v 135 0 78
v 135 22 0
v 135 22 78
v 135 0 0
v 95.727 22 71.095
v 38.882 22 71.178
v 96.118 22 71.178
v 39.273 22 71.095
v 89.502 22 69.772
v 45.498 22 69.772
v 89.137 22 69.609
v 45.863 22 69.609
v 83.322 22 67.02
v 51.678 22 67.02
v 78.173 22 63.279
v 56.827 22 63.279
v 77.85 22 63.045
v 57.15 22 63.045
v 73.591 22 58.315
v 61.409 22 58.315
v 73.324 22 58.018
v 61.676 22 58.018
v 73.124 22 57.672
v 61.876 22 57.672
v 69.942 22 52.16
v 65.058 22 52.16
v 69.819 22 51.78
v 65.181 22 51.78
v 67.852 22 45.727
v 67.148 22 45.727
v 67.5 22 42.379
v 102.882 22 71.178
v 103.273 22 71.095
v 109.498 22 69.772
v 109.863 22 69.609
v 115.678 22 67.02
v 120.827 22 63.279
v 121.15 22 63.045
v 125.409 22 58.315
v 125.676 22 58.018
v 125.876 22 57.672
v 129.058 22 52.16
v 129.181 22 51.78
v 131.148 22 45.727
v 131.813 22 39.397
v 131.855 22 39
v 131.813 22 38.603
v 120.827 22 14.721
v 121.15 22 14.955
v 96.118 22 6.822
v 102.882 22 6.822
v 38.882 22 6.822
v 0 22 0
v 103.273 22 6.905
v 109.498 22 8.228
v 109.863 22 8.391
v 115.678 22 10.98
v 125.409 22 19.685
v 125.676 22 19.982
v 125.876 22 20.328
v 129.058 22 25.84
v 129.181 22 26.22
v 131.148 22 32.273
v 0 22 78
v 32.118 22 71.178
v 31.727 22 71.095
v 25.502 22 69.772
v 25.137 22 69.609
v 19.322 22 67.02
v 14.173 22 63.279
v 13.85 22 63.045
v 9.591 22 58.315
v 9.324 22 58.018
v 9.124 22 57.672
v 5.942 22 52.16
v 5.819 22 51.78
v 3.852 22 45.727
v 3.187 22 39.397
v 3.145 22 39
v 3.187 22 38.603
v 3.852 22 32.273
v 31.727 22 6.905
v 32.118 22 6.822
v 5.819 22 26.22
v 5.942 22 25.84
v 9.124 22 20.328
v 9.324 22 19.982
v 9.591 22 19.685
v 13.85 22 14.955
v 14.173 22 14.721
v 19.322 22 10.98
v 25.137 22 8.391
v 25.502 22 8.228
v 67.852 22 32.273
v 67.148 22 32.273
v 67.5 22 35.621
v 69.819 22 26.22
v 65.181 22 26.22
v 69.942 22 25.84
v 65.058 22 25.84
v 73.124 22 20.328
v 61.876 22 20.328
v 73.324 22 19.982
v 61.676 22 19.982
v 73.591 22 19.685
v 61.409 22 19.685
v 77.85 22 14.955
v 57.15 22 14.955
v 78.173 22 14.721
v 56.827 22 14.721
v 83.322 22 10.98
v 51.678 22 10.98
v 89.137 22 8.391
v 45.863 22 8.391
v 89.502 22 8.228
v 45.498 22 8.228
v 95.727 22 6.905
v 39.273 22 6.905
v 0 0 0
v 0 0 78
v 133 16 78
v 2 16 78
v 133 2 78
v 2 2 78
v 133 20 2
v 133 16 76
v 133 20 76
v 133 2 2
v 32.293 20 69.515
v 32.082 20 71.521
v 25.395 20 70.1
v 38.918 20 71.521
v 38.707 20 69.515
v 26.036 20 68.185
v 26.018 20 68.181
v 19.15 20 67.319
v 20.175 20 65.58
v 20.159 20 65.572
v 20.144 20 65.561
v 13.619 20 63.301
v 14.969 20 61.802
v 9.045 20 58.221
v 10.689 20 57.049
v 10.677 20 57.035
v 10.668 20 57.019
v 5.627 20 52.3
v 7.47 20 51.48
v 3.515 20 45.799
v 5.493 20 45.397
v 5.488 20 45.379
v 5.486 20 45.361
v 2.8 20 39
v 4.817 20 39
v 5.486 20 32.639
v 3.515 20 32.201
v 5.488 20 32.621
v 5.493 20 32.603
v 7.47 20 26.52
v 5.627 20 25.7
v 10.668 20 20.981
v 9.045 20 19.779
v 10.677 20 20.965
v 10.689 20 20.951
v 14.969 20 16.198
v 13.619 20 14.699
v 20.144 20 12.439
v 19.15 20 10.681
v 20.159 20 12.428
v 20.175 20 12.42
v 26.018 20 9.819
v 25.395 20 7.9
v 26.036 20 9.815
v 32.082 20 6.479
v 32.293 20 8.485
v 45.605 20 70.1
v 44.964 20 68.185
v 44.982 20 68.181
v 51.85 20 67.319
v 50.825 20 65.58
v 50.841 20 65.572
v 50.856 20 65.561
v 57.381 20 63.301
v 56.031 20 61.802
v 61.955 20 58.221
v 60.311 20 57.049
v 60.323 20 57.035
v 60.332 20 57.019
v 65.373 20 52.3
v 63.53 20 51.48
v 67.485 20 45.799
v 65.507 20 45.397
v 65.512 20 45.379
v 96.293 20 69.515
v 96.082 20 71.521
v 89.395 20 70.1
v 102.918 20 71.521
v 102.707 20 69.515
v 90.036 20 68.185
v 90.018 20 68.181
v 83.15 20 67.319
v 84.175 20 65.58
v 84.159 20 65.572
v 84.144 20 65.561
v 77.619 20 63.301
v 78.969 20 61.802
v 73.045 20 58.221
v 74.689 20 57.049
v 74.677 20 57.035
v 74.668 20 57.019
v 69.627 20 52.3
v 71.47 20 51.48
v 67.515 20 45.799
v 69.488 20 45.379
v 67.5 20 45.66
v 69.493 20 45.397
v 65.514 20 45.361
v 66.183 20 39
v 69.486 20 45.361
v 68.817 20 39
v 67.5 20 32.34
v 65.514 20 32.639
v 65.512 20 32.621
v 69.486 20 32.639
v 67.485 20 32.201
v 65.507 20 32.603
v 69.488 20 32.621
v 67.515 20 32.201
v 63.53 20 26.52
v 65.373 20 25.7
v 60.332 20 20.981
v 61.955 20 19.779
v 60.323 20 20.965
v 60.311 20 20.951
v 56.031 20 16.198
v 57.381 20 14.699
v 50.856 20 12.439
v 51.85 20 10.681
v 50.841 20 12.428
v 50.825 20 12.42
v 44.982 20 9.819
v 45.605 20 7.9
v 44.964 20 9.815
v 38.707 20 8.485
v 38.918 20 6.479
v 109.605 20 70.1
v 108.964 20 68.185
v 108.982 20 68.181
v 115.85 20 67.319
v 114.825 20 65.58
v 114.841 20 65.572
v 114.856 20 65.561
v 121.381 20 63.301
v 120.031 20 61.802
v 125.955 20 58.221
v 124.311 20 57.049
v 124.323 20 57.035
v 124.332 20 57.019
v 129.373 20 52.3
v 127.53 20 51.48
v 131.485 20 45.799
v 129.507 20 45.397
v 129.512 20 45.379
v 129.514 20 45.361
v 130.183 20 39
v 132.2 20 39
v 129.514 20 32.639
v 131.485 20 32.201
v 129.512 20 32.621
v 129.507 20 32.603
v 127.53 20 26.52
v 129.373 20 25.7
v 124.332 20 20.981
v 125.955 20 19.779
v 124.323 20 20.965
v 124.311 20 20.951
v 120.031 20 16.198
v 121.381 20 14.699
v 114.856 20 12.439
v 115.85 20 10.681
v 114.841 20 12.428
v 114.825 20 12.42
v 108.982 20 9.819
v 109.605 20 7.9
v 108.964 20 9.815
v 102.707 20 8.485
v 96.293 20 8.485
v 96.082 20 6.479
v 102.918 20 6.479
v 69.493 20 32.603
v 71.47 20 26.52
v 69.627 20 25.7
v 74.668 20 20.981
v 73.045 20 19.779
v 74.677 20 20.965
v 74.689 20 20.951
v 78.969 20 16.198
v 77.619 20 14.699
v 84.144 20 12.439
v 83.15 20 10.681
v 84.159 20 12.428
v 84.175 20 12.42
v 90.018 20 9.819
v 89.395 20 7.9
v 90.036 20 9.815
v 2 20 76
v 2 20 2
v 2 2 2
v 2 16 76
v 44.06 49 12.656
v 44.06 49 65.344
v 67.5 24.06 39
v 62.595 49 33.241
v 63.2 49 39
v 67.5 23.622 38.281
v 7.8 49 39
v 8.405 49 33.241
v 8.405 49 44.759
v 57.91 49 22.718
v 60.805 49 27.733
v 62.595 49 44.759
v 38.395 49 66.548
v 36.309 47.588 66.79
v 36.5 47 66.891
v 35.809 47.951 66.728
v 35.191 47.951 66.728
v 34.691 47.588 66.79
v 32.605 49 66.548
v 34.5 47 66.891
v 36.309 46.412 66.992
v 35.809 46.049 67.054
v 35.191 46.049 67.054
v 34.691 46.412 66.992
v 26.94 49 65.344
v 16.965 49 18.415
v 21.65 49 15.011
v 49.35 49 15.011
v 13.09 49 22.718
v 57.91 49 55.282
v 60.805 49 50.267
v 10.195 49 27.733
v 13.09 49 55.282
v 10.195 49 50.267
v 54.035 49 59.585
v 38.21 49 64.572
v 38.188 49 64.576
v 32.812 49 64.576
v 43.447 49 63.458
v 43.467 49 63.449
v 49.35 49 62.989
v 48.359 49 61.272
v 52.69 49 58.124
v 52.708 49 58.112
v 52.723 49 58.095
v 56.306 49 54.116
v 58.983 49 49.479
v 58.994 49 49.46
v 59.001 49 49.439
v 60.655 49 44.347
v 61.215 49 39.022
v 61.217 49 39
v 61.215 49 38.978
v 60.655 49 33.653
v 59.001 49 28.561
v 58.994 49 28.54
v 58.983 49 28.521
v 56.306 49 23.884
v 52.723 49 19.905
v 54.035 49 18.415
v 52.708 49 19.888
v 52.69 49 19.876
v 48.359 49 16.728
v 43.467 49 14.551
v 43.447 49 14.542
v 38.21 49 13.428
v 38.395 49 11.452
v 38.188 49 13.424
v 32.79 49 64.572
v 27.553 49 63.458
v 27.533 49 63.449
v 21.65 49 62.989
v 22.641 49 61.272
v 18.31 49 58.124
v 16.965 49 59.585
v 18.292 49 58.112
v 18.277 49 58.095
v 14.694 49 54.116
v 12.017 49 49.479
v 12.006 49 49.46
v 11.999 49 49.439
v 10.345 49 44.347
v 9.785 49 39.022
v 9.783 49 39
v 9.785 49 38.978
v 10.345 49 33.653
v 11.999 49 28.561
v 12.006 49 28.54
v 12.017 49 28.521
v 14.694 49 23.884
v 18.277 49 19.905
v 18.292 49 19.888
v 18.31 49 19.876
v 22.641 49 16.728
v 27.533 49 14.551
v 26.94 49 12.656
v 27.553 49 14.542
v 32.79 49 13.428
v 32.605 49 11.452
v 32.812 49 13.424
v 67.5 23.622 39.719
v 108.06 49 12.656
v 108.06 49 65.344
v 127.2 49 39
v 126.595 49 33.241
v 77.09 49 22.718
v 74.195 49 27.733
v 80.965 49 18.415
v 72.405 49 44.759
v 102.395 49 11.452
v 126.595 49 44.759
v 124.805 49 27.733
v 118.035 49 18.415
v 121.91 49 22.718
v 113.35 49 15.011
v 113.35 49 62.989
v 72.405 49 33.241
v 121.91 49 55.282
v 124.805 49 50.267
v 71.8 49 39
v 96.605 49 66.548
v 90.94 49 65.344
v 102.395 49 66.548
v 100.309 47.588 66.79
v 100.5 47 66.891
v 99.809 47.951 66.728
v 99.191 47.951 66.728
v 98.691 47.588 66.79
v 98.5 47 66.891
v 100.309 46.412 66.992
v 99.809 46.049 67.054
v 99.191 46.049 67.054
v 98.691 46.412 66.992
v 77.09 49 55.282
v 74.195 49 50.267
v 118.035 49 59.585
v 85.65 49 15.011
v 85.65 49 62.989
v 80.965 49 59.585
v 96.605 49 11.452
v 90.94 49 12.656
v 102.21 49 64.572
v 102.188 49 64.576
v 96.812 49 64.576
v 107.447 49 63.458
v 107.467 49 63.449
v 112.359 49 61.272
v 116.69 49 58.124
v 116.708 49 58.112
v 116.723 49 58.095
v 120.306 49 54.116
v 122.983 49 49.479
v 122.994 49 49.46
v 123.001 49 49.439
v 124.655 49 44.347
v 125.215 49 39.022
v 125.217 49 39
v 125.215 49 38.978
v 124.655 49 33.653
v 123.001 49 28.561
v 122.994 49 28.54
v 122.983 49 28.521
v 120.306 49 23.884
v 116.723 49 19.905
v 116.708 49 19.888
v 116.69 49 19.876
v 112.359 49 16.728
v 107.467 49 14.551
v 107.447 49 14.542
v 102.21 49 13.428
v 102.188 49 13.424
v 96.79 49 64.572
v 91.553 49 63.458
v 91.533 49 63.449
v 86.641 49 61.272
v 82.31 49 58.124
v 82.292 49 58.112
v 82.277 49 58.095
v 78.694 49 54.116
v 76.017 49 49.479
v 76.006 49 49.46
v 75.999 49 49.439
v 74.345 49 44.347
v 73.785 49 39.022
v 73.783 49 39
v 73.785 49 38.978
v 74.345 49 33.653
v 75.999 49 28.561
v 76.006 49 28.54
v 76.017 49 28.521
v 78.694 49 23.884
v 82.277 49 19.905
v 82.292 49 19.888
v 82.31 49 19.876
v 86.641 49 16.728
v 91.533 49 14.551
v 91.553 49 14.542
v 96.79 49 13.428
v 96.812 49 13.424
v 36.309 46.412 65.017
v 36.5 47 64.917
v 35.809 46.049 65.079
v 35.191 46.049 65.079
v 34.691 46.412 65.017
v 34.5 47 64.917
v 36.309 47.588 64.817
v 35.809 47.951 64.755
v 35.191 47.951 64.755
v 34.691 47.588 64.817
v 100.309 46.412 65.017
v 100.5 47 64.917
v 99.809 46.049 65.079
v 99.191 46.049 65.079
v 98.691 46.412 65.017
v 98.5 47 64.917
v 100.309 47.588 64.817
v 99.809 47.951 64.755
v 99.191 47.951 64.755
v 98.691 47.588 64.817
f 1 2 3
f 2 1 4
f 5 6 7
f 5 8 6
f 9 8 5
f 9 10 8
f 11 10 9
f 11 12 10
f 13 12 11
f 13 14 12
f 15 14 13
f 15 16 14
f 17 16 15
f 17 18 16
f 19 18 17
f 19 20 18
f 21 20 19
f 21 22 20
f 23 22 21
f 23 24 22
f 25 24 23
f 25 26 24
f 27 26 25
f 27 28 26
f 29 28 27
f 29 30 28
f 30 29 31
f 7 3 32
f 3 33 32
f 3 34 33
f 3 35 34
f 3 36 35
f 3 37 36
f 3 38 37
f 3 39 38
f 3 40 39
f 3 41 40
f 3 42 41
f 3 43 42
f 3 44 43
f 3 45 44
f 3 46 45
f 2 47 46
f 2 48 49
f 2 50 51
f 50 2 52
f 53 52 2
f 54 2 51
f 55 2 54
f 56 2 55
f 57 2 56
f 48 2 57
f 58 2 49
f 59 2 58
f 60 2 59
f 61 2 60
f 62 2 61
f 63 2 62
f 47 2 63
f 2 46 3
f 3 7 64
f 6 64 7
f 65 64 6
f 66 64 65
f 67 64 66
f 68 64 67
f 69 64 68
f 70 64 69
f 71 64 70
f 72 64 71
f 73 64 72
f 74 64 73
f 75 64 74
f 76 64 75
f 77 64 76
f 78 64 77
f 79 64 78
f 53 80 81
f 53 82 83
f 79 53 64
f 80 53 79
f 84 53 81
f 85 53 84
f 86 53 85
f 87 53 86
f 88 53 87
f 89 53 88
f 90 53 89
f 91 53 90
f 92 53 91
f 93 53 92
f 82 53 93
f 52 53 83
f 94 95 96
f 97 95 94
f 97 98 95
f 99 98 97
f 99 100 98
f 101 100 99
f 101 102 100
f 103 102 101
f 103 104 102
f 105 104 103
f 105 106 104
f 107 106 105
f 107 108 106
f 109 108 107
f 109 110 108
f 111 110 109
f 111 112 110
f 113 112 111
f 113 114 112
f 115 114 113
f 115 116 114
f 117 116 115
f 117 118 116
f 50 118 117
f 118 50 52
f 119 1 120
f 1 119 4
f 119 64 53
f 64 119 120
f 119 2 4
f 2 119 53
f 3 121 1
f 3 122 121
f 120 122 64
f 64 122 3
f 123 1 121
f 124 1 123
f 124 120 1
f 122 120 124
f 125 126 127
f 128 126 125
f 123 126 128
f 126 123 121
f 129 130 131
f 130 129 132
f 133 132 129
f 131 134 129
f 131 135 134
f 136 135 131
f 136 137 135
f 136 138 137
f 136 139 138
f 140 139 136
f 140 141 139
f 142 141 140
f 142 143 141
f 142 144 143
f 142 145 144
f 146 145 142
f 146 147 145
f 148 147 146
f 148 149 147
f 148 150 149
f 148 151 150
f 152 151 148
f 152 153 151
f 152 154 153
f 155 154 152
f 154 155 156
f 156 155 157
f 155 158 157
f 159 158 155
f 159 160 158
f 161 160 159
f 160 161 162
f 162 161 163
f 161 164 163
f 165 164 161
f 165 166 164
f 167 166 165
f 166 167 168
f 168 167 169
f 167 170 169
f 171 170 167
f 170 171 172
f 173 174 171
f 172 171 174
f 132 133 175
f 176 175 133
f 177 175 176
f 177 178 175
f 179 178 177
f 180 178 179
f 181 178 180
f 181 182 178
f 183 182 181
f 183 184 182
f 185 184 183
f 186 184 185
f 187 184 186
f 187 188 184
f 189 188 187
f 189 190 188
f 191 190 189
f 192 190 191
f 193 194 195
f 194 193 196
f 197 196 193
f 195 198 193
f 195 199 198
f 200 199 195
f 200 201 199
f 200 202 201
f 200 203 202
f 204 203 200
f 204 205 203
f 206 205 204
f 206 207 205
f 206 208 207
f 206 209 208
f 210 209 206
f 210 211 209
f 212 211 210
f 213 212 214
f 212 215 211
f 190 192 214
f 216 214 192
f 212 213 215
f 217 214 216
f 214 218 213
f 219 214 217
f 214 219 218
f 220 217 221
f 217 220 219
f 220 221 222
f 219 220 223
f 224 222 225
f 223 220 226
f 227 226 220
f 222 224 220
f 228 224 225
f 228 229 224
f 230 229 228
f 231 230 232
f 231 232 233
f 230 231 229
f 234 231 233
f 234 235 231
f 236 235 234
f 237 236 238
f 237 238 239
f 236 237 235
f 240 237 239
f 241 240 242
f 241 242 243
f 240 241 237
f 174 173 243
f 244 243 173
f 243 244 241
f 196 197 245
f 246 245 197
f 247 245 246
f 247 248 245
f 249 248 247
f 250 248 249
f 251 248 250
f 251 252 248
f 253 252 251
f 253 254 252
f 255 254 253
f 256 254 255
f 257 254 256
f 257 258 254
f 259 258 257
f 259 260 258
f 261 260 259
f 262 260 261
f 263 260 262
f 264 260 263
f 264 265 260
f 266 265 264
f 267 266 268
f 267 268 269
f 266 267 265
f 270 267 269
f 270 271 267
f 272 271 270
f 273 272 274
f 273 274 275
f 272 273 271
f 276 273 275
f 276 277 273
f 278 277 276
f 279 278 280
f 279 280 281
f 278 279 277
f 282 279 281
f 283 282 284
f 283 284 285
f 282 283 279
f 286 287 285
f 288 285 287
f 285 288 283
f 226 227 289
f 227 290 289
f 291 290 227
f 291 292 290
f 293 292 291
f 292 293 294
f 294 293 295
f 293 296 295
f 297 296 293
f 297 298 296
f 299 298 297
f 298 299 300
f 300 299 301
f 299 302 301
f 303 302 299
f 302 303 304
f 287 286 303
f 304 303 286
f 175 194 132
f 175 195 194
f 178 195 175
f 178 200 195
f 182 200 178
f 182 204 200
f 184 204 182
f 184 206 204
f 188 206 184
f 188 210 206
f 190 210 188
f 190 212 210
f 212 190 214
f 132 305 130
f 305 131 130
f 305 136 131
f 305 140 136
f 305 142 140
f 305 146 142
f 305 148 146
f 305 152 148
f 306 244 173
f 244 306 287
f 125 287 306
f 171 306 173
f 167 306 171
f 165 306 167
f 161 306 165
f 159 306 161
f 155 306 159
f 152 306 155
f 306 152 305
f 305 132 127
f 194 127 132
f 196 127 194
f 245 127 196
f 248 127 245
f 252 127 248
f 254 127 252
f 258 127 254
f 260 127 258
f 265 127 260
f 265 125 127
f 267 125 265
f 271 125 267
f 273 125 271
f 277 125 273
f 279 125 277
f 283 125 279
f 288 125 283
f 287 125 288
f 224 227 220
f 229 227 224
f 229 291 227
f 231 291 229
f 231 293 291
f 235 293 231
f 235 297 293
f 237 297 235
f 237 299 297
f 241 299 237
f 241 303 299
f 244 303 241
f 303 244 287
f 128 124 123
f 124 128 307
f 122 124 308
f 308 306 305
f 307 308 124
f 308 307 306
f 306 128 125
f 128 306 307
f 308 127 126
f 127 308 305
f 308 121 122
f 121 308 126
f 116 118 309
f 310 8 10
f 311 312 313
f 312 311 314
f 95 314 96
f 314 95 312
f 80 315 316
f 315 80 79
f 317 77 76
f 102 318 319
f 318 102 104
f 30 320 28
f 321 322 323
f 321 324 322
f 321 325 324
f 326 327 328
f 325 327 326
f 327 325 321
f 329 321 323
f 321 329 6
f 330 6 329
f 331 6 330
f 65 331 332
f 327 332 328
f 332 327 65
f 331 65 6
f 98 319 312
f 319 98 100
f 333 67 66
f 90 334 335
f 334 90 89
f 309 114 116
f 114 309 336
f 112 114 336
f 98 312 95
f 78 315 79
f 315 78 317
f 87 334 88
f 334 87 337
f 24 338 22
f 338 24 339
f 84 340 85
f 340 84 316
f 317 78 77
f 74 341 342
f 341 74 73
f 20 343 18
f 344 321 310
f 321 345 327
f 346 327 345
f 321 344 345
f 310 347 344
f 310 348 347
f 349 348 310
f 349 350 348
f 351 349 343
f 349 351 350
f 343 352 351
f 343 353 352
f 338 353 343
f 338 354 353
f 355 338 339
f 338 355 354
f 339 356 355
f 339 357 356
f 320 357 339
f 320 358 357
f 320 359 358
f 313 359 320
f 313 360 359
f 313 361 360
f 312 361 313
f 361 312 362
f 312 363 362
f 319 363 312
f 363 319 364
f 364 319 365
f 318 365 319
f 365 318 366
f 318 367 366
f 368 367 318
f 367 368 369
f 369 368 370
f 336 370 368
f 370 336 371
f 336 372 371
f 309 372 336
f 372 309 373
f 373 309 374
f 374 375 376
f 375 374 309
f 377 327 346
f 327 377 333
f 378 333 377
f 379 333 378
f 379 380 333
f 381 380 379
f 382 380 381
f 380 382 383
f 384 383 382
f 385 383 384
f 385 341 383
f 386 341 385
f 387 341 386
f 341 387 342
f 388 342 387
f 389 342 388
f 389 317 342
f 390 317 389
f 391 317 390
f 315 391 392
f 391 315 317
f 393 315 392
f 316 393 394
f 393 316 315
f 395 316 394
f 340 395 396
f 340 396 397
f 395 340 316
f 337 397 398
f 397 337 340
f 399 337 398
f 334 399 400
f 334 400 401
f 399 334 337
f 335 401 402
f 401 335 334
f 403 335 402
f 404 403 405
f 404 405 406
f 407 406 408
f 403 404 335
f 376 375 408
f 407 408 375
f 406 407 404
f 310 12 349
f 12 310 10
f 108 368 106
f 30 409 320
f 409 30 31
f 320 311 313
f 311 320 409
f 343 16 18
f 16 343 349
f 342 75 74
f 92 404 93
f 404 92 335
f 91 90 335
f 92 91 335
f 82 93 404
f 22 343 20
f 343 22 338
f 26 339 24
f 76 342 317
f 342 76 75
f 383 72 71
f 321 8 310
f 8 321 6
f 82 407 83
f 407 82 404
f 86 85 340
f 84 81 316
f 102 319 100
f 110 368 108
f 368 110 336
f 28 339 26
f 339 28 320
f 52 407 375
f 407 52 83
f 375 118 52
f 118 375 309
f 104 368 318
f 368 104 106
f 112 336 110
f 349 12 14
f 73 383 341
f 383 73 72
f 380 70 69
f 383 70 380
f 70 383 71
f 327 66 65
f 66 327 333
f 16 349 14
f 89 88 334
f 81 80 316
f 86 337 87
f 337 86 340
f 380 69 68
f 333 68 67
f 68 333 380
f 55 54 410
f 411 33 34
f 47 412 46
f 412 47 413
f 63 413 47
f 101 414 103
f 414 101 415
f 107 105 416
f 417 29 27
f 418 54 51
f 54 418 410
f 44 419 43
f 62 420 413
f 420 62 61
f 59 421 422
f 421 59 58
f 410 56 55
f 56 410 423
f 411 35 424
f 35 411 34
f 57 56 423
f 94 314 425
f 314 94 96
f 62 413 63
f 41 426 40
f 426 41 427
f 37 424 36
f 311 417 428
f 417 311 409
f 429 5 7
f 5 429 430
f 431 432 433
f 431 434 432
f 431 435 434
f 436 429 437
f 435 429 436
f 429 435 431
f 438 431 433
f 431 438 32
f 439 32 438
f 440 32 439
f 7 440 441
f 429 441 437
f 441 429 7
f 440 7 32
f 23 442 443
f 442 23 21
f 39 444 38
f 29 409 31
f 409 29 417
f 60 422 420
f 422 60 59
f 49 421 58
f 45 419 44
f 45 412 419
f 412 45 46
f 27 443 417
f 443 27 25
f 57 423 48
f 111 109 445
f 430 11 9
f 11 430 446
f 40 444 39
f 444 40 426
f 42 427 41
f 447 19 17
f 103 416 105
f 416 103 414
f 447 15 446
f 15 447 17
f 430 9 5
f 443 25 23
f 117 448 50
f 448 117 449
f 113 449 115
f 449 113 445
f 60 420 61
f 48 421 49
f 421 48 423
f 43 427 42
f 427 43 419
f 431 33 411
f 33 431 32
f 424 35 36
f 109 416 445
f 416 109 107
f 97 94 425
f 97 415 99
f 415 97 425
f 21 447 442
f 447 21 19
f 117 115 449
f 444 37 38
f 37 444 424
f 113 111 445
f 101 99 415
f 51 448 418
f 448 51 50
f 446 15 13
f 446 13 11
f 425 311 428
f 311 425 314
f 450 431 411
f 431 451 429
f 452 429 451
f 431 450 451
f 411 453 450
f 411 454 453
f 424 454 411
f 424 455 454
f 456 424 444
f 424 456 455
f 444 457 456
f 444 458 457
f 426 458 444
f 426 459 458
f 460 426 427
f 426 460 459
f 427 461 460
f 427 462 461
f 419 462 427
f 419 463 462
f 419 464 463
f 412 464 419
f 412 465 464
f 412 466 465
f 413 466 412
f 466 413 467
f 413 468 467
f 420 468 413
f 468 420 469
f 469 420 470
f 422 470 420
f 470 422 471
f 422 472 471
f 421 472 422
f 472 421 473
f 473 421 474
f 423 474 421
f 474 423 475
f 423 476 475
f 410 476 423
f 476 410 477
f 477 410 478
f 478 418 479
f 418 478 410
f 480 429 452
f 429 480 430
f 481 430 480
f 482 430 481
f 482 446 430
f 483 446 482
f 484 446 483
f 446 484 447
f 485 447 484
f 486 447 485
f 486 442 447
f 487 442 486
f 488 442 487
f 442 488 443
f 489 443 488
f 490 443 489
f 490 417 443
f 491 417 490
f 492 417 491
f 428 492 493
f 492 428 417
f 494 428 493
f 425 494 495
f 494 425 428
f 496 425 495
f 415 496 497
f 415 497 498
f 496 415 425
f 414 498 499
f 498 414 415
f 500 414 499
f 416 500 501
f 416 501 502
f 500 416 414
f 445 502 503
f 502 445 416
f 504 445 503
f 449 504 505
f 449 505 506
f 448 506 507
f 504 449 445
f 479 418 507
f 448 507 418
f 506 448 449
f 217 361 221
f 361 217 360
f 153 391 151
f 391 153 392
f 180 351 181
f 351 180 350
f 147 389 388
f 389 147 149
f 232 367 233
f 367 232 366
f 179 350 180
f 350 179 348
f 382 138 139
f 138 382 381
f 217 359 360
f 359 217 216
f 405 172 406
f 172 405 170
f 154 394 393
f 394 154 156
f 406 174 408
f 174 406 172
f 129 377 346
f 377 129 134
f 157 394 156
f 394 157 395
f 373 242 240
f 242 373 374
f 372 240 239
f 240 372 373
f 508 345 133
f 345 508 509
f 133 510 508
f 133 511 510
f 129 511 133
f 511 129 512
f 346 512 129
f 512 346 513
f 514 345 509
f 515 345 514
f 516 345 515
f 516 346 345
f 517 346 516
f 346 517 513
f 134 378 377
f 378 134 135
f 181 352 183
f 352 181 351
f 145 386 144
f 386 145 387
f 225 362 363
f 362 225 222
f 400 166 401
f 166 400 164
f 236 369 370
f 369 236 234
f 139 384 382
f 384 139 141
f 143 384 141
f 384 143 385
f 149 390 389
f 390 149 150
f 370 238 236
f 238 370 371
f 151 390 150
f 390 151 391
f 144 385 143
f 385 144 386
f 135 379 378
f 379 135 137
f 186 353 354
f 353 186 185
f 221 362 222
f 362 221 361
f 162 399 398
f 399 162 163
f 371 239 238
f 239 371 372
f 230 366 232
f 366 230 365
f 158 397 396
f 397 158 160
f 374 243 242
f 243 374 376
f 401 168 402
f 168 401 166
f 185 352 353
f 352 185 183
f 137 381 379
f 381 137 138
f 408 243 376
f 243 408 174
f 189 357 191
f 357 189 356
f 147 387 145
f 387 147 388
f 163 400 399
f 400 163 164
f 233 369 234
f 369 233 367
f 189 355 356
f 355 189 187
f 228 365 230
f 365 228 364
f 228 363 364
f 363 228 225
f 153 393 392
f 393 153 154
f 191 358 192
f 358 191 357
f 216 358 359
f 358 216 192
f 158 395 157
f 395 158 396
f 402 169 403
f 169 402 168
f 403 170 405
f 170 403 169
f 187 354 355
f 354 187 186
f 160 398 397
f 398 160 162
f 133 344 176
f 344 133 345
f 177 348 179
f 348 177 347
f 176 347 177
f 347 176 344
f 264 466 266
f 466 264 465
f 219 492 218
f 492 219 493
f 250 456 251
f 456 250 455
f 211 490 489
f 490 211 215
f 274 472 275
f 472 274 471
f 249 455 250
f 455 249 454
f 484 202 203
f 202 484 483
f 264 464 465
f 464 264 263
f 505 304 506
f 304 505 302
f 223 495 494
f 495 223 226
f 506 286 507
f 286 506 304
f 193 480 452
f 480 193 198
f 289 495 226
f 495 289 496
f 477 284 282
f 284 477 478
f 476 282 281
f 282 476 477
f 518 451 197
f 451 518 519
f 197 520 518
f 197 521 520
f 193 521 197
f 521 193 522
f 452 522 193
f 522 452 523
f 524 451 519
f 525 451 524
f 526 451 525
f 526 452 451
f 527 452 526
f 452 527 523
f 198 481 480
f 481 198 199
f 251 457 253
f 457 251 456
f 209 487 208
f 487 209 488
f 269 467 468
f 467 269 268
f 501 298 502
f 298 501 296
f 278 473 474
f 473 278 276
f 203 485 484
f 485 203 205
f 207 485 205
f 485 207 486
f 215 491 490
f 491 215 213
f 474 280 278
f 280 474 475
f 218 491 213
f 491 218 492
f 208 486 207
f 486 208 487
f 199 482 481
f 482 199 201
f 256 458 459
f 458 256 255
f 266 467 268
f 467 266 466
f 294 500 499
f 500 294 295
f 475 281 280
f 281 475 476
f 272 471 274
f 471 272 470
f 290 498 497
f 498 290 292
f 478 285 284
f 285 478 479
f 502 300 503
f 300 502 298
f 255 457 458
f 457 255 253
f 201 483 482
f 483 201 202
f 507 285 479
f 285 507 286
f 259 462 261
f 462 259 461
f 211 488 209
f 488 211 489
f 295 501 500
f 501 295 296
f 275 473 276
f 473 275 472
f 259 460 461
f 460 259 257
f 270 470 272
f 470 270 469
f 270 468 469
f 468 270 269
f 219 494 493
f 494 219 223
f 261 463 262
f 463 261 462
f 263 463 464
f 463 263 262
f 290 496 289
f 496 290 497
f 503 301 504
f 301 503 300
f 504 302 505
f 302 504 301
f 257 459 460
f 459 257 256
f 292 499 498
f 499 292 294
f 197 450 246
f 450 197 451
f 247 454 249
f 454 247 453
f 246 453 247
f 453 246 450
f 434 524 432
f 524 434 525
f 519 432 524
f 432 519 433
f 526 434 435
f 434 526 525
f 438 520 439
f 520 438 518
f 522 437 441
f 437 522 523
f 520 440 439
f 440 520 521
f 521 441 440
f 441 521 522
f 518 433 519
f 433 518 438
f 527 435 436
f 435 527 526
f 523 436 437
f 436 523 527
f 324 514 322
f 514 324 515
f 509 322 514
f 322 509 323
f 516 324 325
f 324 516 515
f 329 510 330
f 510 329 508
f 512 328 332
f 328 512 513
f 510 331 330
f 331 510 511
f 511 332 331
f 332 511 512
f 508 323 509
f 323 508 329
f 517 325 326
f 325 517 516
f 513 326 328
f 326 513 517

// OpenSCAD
//Screen Length
screen_width = 131; //[1:250]
//Screen Width
screen_height = 74; //[1:170]
//Screen Cavity Height
screen_cavity_height = 18; //[4:100]
//Lens Cup Height
lens_height = 29; //[4:100]
//Lens Radius
lens_radius = 25.7;//[2:100]
//IPD
IPD = 64;//[45:85]
//Screen Opening Height
back_opening_height = 14;//[0:96]
//Wall Thickness
wall_thickness = 2;//[1:5]
//Screw Hole Radius
screw_radius = 1;//[0:5]
//Screw Hole Depth
screw_depth = 2;//[0:5]

translate([0,0,screen_height+(2*wall_thickness)]) rotate([-90,0,0]) difference(){
difference(){
//Right Lens Cavity
difference(){
	//Left Lens Cavity
	difference(){
		//Right Lens Outer
		union(){
			//Left Lens Outer
			union(){
				//Backdoor
				difference(){
					//Screen Cavity
					difference(){
						cube([screen_width+(wall_thickness*2),screen_height+(wall_thickness*2),screen_cavity_height+(wall_thickness*2)]);
						translate([wall_thickness,wall_thickness,wall_thickness]) cube([screen_width,screen_height,screen_cavity_height]);
					}
					translate([wall_thickness,-0.1,wall_thickness]) cube([screen_width,wall_thickness+0.2,back_opening_height]);
				}
				translate([(screen_width/2)-(IPD/2)+wall_thickness,(screen_height/2)+wall_thickness,screen_cavity_height+wall_thickness]) cylinder(lens_height,lens_radius+5+wall_thickness,lens_radius+wall_thickness);
			}
			translate([(screen_width/2)+(IPD/2)+wall_thickness,(screen_height/2)+wall_thickness,screen_cavity_height+wall_thickness]) cylinder(lens_height,lens_radius+5+wall_thickness,lens_radius+wall_thickness);
		}
		translate([(screen_width/2)-(IPD/2)+wall_thickness,(screen_height/2)+wall_thickness,screen_cavity_height+wall_thickness-0.1]) cylinder(lens_height+0.2,lens_radius+5,lens_radius);
	}
	translate([(screen_width/2)+(IPD/2)+wall_thickness,(screen_height/2)+wall_thickness,screen_cavity_height+wall_thickness-0.1]) cylinder(lens_height+0.2,lens_radius+5,lens_radius);
}

translate([(screen_width/2)+(IPD/2)+wall_thickness,(screen_height/2)+wall_thickness-lens_radius+1,screen_cavity_height+wall_thickness+lens_height-screw_depth]) rotate([90,0,0])  cylinder(5,screw_radius,screw_radius, $fn = 10);
}
translate([(screen_width/2)-(IPD/2)+wall_thickness,(screen_height/2)+wall_thickness-lens_radius+1,screen_cavity_height+wall_thickness+lens_height-screw_depth]) rotate([90,0,0])  cylinder(5,screw_radius,screw_radius, $fn = 10);
}
